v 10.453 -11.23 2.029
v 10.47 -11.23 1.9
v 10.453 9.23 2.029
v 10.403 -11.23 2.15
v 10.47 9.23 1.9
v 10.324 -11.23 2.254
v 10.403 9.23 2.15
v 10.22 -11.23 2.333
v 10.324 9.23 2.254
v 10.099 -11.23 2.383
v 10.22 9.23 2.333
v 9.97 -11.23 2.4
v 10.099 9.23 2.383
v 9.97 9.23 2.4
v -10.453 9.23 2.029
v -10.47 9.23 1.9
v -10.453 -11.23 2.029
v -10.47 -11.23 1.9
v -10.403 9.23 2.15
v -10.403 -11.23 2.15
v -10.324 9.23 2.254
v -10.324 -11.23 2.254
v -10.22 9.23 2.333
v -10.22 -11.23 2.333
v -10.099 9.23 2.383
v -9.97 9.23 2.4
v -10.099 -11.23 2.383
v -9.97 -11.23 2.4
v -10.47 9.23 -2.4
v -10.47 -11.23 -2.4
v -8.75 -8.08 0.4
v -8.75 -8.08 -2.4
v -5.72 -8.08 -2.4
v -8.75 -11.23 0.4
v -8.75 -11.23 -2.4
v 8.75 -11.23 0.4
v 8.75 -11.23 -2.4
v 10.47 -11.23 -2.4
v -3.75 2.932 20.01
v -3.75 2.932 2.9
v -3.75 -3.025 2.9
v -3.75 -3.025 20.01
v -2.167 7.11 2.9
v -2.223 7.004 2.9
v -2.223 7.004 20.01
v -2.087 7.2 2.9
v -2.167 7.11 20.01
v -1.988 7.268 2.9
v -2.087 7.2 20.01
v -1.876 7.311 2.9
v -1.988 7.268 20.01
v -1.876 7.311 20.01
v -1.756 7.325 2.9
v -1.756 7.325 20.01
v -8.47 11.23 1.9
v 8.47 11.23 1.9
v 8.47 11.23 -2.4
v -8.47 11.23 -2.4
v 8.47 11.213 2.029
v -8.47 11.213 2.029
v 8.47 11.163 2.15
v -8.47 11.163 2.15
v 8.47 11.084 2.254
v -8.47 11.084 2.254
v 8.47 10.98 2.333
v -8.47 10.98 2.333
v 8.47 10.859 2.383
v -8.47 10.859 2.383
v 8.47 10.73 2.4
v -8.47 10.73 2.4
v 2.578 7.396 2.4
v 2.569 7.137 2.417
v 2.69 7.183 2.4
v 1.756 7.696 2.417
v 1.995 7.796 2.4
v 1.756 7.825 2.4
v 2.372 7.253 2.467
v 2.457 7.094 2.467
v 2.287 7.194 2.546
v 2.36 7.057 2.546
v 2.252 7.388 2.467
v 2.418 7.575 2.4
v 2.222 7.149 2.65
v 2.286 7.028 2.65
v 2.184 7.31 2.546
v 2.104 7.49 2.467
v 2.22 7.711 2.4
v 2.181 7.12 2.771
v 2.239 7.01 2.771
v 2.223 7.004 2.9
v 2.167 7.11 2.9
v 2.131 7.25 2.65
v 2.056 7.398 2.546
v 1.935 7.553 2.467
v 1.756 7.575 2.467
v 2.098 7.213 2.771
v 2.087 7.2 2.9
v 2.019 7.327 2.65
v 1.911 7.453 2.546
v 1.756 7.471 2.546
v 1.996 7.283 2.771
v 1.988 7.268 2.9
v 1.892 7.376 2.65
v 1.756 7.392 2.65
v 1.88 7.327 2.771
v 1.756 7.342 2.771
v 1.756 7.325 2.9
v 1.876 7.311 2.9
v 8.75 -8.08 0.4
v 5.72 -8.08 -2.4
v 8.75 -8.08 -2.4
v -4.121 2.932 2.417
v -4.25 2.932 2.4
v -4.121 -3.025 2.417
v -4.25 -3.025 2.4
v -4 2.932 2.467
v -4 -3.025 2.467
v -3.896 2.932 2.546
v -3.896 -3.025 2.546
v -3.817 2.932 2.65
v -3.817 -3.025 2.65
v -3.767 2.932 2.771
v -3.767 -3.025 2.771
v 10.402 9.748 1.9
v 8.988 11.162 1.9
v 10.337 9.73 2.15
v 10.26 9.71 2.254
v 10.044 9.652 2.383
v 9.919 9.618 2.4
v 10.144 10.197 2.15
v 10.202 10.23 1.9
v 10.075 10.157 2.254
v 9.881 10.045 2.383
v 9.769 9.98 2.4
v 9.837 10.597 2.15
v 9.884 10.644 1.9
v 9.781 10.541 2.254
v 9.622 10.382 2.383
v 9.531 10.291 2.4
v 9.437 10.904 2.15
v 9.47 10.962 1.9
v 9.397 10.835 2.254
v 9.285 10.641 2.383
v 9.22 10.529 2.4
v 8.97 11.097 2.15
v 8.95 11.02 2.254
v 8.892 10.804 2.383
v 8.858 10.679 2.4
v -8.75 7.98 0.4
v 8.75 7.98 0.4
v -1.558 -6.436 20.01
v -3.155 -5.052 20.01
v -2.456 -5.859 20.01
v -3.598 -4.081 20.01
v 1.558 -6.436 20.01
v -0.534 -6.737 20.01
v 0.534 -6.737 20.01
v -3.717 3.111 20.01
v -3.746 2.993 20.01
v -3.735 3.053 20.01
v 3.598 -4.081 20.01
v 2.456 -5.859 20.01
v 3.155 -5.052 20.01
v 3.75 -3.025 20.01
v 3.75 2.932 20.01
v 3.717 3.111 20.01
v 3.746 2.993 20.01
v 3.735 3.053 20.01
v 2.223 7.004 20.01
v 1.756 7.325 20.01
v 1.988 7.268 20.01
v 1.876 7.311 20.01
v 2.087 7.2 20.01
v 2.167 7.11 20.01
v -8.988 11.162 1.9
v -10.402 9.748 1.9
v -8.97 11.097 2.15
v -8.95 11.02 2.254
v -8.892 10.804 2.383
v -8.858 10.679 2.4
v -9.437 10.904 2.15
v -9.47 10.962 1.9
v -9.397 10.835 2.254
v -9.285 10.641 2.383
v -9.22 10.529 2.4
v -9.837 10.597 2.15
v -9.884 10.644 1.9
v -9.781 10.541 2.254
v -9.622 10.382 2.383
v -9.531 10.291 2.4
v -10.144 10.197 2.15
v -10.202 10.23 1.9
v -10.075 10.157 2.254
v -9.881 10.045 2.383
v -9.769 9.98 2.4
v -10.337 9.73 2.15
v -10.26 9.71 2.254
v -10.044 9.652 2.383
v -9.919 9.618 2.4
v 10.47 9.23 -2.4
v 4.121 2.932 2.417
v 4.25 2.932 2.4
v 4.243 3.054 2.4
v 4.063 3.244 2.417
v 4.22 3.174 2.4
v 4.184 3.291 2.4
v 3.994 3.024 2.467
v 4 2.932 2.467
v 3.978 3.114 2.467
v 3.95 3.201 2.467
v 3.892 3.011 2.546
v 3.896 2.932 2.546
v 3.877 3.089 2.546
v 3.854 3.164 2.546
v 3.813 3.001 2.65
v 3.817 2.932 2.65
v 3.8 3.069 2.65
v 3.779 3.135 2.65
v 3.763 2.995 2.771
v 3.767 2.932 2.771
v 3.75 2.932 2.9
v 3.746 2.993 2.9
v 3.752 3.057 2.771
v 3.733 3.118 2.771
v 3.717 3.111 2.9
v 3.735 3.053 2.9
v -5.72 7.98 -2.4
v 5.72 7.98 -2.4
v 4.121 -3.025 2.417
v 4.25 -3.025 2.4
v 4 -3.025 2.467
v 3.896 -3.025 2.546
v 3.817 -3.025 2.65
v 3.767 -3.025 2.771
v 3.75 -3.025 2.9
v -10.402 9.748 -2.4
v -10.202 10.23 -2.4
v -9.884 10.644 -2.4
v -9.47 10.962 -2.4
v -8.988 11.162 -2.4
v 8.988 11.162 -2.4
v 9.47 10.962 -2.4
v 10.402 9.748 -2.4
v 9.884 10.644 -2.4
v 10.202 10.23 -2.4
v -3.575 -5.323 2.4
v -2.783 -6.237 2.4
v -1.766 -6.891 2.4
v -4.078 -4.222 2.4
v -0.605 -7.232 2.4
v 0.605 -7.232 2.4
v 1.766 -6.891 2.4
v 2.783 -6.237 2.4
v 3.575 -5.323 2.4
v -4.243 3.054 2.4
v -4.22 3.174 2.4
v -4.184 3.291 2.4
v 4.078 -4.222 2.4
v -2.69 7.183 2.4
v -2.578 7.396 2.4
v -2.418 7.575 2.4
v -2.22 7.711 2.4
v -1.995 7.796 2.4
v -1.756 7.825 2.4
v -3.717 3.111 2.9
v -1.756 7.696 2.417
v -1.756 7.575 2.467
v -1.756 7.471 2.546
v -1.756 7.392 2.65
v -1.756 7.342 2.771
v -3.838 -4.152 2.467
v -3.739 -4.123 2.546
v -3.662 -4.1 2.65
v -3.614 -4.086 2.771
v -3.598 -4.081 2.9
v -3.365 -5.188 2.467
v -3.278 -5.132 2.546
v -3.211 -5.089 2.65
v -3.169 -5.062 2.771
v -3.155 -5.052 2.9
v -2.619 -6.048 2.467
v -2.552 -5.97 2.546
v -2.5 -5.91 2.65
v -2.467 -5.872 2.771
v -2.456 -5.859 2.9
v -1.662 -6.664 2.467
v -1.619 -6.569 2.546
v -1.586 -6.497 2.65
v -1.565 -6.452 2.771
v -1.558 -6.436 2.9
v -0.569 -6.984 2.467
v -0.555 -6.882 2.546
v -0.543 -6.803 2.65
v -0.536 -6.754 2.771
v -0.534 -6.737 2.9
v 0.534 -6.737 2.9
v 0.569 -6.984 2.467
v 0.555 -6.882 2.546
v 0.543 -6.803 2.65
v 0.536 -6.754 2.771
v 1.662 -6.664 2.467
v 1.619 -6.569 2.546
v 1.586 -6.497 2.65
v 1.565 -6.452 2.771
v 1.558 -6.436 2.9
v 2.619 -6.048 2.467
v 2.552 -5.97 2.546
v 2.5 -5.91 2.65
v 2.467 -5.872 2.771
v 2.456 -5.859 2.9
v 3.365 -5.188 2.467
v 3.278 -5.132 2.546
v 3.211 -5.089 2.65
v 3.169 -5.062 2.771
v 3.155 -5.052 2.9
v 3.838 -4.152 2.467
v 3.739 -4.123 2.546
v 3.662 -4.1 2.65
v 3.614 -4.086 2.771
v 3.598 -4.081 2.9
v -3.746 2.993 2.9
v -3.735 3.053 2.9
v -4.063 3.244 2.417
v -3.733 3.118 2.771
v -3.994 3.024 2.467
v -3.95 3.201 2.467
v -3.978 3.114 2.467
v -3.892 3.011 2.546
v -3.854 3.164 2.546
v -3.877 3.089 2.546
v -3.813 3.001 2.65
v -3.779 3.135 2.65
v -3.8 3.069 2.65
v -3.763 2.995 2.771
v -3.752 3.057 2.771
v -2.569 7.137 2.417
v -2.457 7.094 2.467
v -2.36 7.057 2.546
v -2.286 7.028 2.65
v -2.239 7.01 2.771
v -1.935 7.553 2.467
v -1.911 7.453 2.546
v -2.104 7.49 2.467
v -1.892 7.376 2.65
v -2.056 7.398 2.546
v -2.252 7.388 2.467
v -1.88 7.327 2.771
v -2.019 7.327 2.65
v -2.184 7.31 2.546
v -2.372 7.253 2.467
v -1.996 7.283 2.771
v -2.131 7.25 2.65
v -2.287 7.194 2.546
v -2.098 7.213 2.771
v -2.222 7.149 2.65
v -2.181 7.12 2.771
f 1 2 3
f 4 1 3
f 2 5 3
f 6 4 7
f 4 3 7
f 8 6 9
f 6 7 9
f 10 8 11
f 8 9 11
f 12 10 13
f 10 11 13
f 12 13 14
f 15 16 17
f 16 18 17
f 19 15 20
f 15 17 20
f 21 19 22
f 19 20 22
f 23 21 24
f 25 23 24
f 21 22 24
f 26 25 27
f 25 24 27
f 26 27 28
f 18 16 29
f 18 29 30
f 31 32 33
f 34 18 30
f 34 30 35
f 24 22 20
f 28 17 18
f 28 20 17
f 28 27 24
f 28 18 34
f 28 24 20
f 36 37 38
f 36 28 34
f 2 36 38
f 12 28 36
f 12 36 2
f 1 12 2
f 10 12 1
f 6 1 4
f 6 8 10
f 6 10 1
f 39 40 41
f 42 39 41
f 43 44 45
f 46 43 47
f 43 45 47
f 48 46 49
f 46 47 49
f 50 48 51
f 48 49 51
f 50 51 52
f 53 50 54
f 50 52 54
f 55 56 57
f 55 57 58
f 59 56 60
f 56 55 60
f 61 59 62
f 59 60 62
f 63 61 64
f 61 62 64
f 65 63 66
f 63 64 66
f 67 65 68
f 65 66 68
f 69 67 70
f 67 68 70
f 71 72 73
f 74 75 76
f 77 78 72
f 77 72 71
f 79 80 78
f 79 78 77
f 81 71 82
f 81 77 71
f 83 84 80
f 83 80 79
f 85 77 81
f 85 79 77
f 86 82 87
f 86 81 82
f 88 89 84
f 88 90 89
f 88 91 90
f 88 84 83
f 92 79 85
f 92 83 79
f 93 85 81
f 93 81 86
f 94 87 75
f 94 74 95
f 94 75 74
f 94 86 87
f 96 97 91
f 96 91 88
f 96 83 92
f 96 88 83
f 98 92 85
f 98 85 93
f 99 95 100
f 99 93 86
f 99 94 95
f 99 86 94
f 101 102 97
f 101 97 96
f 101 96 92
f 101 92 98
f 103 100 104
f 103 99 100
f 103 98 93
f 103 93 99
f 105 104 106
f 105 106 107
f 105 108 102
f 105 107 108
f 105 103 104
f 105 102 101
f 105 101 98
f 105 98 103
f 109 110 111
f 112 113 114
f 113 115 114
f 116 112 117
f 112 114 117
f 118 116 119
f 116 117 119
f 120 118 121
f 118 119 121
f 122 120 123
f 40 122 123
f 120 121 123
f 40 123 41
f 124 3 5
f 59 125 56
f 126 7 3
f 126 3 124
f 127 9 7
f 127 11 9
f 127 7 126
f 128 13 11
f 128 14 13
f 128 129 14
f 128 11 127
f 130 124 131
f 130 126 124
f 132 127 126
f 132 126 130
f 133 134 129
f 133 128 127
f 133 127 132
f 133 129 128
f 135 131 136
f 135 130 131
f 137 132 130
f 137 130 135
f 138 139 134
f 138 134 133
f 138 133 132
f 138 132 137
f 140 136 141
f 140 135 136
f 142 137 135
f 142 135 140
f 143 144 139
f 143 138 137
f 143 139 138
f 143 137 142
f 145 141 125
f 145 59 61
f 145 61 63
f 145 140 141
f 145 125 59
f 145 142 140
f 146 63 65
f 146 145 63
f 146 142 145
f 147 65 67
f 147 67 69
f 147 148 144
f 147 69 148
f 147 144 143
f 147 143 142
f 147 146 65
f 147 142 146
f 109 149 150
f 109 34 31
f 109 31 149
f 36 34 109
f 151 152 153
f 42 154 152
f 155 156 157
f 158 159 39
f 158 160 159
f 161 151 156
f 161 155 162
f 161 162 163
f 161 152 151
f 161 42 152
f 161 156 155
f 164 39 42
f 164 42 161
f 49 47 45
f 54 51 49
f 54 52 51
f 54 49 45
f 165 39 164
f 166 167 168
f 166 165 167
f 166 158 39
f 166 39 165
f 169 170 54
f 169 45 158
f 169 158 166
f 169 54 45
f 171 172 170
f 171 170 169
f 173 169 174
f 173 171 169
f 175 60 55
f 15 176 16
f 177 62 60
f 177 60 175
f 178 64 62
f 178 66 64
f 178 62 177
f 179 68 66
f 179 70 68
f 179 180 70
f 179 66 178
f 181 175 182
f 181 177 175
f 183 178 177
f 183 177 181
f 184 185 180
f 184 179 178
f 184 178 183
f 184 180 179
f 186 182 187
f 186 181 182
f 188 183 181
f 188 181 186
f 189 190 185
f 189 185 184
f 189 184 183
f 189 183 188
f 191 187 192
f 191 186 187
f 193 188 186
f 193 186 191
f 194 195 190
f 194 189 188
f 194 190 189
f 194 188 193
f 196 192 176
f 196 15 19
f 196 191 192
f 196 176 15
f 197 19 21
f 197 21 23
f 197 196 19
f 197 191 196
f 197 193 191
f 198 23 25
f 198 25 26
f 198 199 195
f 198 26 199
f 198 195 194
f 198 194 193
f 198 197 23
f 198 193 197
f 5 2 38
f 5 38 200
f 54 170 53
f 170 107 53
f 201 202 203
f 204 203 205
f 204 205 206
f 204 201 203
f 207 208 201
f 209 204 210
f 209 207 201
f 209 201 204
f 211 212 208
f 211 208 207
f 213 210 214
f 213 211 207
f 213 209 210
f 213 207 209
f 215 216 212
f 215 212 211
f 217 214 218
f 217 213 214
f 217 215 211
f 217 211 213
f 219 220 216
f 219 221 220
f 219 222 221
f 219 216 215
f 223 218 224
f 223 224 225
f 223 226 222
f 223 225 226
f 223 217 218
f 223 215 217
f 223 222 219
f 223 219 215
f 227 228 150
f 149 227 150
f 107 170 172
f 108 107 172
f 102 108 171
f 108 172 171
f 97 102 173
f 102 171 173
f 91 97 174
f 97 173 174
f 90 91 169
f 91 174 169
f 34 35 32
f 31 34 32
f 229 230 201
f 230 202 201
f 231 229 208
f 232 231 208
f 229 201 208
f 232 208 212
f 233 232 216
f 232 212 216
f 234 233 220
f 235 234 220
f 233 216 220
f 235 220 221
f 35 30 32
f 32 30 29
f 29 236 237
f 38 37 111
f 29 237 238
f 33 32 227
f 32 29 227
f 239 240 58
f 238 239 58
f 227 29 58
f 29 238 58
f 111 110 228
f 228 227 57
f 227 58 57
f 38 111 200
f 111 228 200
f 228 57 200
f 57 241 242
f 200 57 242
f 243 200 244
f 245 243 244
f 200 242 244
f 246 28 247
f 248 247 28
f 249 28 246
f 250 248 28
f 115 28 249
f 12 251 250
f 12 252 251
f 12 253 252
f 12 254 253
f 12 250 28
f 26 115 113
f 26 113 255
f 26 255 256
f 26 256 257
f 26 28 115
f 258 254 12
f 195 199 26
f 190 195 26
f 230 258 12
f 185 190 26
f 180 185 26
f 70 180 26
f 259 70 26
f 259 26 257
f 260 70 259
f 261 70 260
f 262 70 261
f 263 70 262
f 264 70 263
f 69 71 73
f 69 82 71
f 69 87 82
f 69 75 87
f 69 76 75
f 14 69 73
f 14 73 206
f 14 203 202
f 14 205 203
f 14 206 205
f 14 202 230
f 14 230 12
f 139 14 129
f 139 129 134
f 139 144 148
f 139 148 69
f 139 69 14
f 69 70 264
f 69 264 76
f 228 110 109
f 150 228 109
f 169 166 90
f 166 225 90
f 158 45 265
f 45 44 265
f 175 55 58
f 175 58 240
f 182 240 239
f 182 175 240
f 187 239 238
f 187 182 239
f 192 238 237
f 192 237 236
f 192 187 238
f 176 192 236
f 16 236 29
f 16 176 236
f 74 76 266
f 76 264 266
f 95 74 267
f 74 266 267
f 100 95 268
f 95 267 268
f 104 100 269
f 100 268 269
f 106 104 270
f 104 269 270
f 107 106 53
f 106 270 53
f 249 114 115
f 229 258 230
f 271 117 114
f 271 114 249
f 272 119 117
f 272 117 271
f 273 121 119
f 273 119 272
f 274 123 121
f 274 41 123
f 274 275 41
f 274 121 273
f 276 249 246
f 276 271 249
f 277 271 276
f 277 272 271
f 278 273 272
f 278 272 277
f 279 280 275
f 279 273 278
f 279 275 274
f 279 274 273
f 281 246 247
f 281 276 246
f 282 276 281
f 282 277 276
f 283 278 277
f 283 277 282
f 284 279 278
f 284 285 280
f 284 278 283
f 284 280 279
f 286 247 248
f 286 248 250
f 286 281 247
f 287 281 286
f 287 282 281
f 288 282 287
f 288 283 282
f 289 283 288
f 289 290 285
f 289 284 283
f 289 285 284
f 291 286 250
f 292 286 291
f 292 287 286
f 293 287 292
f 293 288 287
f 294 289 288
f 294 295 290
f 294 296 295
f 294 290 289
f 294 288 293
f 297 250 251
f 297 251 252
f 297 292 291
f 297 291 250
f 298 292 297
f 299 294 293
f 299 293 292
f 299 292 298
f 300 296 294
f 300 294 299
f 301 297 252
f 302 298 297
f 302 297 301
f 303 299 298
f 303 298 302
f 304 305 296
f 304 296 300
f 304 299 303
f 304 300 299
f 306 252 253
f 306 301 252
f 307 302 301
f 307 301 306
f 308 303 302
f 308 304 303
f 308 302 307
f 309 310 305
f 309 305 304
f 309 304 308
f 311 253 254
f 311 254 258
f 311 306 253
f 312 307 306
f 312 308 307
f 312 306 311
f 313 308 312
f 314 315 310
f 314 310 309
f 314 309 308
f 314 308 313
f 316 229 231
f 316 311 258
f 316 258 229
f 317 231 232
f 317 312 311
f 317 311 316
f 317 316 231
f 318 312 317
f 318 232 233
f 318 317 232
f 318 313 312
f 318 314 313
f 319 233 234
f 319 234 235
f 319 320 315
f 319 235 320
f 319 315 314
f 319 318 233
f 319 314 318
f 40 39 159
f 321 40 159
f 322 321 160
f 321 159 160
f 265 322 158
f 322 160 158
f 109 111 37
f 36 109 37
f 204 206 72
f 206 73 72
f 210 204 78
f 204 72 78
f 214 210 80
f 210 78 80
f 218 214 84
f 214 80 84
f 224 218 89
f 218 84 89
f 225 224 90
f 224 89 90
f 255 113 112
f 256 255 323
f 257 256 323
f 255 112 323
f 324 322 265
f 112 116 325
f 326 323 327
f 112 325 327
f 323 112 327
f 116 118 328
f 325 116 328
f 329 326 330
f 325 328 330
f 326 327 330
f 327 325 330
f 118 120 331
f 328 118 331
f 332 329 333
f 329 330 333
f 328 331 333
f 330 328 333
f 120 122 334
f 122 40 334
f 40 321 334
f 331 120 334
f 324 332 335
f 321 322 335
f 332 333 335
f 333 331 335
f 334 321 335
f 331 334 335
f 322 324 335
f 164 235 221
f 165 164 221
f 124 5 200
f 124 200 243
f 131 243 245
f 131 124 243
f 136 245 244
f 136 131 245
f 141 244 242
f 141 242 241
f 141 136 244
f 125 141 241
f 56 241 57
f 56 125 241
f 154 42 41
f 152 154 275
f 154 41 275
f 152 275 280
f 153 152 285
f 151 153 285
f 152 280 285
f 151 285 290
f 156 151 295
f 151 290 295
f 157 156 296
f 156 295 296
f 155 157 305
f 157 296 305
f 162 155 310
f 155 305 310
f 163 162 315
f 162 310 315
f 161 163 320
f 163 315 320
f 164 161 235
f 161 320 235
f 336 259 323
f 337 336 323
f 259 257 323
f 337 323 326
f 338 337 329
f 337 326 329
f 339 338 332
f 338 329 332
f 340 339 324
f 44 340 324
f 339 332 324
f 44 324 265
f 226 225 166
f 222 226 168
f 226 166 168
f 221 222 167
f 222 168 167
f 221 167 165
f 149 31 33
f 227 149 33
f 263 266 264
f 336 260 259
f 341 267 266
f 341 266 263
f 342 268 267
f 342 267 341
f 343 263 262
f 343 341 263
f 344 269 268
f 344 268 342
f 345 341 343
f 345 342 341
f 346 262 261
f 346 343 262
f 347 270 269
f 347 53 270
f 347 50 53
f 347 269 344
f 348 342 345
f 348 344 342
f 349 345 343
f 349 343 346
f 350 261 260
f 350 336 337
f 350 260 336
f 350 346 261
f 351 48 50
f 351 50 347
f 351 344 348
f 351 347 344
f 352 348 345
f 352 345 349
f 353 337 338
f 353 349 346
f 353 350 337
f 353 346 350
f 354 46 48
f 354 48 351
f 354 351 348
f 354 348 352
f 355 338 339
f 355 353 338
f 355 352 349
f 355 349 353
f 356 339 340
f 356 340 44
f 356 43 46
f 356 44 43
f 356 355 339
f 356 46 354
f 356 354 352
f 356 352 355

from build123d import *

# Parameters (mm, degrees)
F1_DEPTH = 2.4
F3_DEPTH = 17.61
F5_DEPTH = 2.8
F7_DEPTH = 16.06
F8_R     = 0.5


with BuildPart() as f1:
    # F0 (on Top) → F1 (new body, symmetric)
    with BuildSketch(Plane.XY):
        with BuildLine():
            ThreePointArc((10.47, 9.23), (9.8842135624, 10.6442135624), (8.47, 11.23))
            Line((8.47, 11.23), (-8.47, 11.23))
            ThreePointArc((-8.47, 11.23), (-9.8842135624, 10.6442135624), (-10.47, 9.23))
            Line((-10.47, 9.23), (-10.47, -11.23))
            Line((-10.47, -11.23), (10.47, -11.23))
            Line((10.47, -11.23), (10.47, 9.23))
        make_face()
    extrude(amount=F1_DEPTH, both=True)

    # F2 (on face) → F3 (join)
    with BuildSketch(Plane.XY.offset(2.4)):
        with BuildLine():
            ThreePointArc((-3.75, -3.025), (0, -6.775), (3.75, -3.025))
            Line((3.75, -3.025), (3.75, 3.025))
            Line((3.75, 3.025), (2.1, 7.325))
            Line((2.1, 7.325), (-2.1, 7.325))
            Line((-2.1, 7.325), (-3.75, 3.025))
            Line((-3.75, 3.025), (-3.75, -3.025))
        make_face()
    extrude(amount=F3_DEPTH)

    # F4 (on face) → F5 (cut)
    with BuildSketch(Plane(origin=(0, 0, -2.4), x_dir=(1, 0, 0), z_dir=(0, 0, -1))):
        Polygon((-5.72, 8.08), (-5.72, -7.98), (5.72, -7.98), (5.72, 8.08), (8.75, 8.08), (8.75, 11.23), (-8.75, 11.23), (-8.75, 8.08), align=None)
    extrude(amount=-F5_DEPTH, mode=Mode.SUBTRACT)

    # F6 (on face) → F7 (cut, through all)
    with BuildSketch(Plane.XZ.offset(8.08)):
        Polygon((-8.75, 0.4), (-5.72, -2.4), (-5.72, 0.4), align=None)
        Polygon((5.72, -2.4), (8.75, 0.4), (5.72, 0.4), align=None)
    extrude(amount=-F7_DEPTH, mode=Mode.SUBTRACT)

    # F8
    f8_edges = [f1.edges().sort_by_distance(p)[0] for p in [
        (10.47, -1, 2.4),
        (3.75, 3.025, 11.205),
        (-3.75, 3.025, 11.205),
        (-2.1, 7.325, 11.205),
        (2.1, 7.325, 11.205),
        (0, -6.775, 2.4),
        (9.884214, 10.644214, 2.4),
        (-10.47, -1, 2.4),
        (-9.884214, 10.644214, 2.4),
        (0, 11.23, 2.4),
        (3.75, 0, 2.4),
        (2.925, 5.175, 2.4),
        (0, 7.325, 2.4),
        (-2.925, 5.175, 2.4),
        (-3.75, 0, 2.4),
    ]]
    fillet(f8_edges, radius=F8_R)


solid = f1.part
